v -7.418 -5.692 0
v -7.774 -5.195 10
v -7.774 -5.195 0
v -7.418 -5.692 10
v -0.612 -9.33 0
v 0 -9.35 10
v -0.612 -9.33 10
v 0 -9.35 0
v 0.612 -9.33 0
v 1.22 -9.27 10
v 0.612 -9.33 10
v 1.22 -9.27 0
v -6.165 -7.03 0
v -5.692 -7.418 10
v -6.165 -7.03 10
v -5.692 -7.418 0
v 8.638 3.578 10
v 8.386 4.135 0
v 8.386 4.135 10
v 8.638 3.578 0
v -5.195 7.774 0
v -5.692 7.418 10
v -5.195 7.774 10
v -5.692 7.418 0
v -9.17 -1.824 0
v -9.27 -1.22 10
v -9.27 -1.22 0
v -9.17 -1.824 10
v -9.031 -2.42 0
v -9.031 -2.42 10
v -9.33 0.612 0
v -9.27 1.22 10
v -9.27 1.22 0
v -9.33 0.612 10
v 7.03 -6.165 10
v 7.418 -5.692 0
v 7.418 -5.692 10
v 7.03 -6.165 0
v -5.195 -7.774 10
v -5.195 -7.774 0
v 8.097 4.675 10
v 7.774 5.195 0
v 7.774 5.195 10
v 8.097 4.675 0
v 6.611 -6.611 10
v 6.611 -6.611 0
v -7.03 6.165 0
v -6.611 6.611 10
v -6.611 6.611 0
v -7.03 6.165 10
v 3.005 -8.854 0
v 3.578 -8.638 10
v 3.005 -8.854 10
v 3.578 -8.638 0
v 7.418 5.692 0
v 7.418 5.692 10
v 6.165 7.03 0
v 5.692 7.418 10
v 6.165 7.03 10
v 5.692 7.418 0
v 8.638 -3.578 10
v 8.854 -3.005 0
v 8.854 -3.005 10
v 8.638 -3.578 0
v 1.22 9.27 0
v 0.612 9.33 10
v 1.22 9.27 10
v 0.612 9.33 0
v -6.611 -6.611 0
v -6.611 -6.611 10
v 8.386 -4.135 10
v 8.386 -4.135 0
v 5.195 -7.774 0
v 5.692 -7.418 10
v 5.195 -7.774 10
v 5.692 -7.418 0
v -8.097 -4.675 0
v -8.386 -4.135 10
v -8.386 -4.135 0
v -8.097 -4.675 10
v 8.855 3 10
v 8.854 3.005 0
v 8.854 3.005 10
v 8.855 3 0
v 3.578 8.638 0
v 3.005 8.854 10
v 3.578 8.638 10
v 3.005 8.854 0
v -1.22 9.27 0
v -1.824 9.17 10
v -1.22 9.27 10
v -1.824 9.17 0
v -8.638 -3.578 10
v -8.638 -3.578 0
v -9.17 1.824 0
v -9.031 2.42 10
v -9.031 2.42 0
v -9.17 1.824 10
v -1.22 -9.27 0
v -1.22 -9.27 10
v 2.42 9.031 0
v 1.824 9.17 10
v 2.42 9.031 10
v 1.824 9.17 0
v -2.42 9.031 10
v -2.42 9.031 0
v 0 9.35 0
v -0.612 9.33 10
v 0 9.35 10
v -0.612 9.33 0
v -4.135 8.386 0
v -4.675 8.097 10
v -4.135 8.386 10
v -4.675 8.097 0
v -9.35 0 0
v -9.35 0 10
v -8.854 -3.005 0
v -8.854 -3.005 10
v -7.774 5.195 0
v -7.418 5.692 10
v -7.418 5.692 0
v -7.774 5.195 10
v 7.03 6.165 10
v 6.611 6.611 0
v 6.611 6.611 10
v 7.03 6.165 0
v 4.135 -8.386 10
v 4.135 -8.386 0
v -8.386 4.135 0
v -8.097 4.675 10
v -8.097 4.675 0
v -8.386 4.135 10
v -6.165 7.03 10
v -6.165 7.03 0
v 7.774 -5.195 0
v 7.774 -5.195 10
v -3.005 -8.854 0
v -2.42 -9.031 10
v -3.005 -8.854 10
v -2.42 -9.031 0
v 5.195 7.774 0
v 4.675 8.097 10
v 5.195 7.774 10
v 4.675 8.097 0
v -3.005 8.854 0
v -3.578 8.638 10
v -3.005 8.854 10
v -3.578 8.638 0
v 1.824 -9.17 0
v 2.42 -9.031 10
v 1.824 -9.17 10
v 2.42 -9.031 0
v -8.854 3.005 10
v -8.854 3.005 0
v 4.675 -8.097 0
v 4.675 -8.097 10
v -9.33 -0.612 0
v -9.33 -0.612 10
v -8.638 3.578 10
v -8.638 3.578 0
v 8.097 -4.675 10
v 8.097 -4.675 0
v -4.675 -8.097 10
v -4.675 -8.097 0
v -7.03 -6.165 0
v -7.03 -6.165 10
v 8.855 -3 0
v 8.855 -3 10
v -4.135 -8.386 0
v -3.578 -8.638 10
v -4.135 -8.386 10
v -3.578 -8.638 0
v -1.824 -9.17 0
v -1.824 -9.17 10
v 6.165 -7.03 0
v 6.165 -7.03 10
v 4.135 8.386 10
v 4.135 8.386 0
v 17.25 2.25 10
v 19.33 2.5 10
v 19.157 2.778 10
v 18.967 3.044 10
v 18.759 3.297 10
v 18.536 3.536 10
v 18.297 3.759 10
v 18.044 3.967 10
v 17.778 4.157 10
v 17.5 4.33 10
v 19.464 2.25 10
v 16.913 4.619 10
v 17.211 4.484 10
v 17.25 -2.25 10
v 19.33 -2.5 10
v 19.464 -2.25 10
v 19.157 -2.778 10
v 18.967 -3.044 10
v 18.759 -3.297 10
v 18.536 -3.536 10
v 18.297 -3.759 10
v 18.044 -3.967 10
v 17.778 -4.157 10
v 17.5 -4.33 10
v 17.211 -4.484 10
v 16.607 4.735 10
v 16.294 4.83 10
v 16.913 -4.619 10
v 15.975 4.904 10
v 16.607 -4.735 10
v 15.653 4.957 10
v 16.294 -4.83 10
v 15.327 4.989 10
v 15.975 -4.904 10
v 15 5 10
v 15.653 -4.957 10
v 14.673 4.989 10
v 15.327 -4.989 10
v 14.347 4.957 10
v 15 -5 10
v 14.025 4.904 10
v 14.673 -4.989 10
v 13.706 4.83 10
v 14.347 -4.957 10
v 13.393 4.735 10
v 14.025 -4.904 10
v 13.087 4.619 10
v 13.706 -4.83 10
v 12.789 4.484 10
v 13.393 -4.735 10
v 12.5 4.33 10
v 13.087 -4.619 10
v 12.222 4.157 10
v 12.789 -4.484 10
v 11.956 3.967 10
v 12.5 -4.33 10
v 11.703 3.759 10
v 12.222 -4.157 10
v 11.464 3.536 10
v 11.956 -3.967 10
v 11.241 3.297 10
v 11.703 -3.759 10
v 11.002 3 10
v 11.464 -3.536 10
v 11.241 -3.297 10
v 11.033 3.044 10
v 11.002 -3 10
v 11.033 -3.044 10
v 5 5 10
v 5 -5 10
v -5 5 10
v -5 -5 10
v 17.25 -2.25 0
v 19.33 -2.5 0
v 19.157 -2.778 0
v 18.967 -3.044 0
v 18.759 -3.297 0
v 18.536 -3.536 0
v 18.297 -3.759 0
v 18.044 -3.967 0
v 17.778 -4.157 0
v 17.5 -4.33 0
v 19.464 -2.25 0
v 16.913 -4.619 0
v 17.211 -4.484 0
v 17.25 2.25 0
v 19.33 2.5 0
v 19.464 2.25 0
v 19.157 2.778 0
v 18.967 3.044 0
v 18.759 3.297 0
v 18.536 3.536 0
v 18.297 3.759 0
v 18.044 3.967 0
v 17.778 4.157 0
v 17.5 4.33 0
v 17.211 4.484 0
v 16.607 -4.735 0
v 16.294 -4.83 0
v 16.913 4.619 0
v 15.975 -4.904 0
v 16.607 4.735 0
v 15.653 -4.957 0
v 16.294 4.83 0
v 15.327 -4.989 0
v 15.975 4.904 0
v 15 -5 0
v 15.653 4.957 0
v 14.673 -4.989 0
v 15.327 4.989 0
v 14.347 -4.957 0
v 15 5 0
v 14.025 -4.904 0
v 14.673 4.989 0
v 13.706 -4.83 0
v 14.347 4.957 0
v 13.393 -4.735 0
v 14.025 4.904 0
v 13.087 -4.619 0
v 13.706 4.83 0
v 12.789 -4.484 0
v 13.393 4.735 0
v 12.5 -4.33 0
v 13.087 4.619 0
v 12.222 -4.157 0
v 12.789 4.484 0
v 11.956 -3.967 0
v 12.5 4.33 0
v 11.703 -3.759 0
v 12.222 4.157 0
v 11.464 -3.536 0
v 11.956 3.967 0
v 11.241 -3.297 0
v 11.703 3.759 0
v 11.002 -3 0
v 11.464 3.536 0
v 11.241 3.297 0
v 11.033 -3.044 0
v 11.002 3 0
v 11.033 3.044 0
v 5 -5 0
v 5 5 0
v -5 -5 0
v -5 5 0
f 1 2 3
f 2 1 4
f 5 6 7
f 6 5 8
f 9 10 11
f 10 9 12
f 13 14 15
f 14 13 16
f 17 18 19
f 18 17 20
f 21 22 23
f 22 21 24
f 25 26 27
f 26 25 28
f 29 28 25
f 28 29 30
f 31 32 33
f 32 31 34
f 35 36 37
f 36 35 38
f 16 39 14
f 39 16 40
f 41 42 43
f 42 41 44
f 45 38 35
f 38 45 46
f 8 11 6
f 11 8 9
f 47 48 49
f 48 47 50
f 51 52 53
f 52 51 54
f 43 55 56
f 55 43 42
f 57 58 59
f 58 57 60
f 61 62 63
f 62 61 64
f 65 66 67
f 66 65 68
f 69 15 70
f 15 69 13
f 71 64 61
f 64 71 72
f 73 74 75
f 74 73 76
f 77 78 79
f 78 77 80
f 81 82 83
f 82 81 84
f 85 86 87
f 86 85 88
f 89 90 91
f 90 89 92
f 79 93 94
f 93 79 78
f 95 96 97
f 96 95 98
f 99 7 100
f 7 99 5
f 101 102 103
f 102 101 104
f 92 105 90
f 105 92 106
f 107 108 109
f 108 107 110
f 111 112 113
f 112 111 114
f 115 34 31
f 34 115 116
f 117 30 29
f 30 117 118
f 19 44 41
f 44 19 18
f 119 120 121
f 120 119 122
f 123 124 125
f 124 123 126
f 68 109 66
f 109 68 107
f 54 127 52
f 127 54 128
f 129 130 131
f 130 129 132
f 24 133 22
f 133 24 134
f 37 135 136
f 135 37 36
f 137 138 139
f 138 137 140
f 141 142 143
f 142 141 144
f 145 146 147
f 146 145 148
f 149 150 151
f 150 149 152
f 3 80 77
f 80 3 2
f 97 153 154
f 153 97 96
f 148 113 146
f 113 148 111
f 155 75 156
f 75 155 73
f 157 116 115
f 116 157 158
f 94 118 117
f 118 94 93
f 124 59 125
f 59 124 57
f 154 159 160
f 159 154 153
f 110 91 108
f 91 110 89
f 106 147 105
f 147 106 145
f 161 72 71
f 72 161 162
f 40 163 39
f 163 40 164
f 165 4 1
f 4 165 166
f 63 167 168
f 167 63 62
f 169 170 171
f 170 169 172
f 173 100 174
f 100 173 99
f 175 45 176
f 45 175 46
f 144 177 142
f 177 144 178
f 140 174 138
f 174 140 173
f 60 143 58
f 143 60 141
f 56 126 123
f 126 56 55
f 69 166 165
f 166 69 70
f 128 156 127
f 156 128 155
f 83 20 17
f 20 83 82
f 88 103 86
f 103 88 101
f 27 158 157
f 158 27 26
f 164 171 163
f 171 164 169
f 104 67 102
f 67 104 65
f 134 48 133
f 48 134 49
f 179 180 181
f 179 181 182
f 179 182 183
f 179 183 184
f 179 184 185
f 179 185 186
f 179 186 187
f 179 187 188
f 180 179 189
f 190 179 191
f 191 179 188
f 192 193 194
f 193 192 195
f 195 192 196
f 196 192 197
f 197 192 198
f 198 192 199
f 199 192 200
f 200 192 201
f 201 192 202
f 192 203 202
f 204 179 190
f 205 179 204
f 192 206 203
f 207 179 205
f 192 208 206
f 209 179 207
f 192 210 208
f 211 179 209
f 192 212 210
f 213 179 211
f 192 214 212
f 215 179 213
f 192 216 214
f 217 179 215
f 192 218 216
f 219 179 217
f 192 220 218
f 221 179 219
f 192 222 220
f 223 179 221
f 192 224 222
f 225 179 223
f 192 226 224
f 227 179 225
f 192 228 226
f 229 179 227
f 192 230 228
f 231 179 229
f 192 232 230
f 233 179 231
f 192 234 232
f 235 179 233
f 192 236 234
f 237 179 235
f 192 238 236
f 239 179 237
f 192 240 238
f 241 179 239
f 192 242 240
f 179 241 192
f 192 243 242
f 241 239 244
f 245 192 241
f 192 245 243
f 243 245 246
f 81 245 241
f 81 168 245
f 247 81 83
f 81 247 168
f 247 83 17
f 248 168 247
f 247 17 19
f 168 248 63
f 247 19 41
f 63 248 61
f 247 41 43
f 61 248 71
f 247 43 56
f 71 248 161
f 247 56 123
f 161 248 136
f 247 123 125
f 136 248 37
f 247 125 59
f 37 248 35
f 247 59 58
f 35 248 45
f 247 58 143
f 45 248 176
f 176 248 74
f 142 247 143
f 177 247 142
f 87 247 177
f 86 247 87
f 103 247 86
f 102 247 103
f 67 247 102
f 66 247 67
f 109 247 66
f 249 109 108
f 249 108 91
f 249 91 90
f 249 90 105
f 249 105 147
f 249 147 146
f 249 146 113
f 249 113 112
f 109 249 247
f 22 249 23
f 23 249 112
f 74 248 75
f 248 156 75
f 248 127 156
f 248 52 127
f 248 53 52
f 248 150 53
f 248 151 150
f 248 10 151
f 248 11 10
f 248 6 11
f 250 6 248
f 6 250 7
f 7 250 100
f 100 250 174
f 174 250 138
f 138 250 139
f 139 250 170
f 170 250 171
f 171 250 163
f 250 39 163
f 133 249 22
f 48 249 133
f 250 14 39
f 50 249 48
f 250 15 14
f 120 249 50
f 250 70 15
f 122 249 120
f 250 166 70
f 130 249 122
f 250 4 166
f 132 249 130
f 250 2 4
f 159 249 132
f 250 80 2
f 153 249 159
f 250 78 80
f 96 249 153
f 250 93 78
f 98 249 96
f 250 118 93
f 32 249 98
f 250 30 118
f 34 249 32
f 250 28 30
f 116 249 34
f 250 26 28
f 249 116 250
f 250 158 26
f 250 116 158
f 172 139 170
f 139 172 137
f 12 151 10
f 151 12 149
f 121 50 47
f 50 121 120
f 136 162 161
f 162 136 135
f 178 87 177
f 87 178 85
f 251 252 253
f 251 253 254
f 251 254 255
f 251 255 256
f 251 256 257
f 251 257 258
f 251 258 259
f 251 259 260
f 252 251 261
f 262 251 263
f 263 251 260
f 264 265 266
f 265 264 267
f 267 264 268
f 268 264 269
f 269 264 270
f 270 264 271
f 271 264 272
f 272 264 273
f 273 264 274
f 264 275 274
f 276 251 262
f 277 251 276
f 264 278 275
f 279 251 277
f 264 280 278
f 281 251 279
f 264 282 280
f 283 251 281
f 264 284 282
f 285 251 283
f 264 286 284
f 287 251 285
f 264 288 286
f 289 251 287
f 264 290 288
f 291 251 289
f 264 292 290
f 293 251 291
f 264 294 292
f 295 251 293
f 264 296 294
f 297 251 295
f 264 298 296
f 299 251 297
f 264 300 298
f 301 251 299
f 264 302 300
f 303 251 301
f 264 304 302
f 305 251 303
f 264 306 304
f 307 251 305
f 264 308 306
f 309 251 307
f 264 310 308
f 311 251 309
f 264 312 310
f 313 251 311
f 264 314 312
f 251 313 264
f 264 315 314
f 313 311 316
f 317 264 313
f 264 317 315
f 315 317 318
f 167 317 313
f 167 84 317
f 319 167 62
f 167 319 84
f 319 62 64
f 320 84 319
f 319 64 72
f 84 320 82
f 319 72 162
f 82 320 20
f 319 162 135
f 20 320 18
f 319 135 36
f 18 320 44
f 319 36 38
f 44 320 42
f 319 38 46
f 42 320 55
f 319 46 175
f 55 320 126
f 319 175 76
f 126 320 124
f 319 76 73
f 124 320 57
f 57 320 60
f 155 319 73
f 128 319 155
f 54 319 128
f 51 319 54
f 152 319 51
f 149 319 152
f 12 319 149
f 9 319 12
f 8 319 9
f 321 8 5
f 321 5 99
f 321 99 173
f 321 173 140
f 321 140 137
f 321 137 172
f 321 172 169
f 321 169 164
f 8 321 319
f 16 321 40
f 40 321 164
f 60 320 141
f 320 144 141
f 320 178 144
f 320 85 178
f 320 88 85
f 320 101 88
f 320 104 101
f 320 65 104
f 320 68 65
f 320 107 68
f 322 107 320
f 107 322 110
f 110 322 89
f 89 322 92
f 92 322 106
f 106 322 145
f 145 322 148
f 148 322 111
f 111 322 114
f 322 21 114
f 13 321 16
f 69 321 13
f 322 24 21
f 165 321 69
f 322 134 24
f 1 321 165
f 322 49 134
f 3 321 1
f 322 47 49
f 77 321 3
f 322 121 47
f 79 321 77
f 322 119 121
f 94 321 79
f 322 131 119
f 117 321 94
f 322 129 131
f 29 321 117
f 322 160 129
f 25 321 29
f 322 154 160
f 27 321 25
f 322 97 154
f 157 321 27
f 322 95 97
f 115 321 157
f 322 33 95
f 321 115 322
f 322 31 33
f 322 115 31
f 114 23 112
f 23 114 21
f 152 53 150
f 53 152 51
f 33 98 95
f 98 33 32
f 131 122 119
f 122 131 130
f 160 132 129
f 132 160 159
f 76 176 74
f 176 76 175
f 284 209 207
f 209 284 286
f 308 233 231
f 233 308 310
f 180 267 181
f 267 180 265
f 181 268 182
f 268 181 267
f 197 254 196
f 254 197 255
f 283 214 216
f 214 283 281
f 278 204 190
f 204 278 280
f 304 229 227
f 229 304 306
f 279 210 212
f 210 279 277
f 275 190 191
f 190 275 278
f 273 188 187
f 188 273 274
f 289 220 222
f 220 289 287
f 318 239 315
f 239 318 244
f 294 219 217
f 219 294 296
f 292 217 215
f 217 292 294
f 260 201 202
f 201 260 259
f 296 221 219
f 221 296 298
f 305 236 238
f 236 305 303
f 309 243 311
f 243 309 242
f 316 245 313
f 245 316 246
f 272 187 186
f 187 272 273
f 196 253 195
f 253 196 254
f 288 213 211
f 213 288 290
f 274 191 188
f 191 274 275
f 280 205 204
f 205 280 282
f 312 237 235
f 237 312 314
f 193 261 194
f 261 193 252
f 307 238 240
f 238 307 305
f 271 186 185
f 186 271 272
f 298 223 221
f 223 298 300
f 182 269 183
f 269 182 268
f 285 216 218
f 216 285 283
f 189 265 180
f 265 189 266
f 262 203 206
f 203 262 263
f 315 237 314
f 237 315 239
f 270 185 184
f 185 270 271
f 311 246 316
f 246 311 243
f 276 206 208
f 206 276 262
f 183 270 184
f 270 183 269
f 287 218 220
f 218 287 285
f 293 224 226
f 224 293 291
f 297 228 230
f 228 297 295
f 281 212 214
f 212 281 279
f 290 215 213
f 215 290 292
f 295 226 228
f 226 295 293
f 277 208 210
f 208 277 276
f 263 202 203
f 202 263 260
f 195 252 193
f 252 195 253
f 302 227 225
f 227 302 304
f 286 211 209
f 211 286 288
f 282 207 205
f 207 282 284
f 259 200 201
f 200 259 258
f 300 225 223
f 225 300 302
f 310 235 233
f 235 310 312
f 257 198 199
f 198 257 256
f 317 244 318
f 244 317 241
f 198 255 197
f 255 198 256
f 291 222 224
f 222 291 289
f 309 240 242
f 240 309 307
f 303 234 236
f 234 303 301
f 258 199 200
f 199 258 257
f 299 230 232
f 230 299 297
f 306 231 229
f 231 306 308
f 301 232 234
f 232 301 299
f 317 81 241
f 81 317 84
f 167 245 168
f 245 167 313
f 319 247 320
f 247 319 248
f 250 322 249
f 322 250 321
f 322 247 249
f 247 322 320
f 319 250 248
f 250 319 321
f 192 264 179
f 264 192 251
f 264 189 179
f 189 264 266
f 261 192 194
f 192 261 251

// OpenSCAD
// Tubing/stand rod snap-on clip
// Print orientation: flat on bed, z = 0 up to z = 10

// ---- Stand rod ring ----
stand_d     = 12.7;   // stand rod diameter
stand_wall  = 3;      // stand ring wall thickness
stand_out   = stand_d + 2 * stand_wall; // 18.7 mm outer diameter
stand_open  = 10;     // width of -X side opening
stand_z     = 10;     // ring height (Z)

// ---- Tubing ring ----
tube_d      = 6;      // tubing inner diameter
tube_wall   = 2;      // tubing ring wall thickness
tube_x      = 15;     // tubing ring centre X
tube_y      = 0;      // tubing ring centre Y
tube_out    = tube_d + 2 * tube_wall;   // 10 mm outer diameter
tube_open   = 4.5;    // width of +X side opening
tube_z      = 10;     // ring height (Z)

// ---- Bridge ----
bridge_x0   = 8;      // bridge start X
bridge_x1   = 12;     // bridge end X
bridge_w    = 6;      // bridge width (Y)

// ---- Misc ----
eps         = 0.5;    // cutter overshoot past faces
$fn         = 96;     // curve resolution

difference() {
    union() {
        // Stand rod ring
        cylinder(d = stand_out, h = stand_z);
        // Tubing ring
        translate([tube_x, tube_y, 0]) cylinder(d = tube_out, h = tube_z);
        // Solid bridge between rings
        translate([bridge_x0, -bridge_w / 2, 0])
            cube([bridge_x1 - bridge_x0, bridge_w, stand_z]);
    }
    // Stand ring opening: x < 0, -5 < y < 5
    translate([-stand_open / 2, -stand_open / 2, -eps])
        cube([stand_open, stand_open, stand_z + 2 * eps]);
    // Tubing ring opening: x > 15, -2.25 < y < 2.25
    translate([tube_x + tube_open / 2, -tube_open / 2, -eps])
        cube([tube_open, tube_open, tube_z + 2 * eps]);
}
